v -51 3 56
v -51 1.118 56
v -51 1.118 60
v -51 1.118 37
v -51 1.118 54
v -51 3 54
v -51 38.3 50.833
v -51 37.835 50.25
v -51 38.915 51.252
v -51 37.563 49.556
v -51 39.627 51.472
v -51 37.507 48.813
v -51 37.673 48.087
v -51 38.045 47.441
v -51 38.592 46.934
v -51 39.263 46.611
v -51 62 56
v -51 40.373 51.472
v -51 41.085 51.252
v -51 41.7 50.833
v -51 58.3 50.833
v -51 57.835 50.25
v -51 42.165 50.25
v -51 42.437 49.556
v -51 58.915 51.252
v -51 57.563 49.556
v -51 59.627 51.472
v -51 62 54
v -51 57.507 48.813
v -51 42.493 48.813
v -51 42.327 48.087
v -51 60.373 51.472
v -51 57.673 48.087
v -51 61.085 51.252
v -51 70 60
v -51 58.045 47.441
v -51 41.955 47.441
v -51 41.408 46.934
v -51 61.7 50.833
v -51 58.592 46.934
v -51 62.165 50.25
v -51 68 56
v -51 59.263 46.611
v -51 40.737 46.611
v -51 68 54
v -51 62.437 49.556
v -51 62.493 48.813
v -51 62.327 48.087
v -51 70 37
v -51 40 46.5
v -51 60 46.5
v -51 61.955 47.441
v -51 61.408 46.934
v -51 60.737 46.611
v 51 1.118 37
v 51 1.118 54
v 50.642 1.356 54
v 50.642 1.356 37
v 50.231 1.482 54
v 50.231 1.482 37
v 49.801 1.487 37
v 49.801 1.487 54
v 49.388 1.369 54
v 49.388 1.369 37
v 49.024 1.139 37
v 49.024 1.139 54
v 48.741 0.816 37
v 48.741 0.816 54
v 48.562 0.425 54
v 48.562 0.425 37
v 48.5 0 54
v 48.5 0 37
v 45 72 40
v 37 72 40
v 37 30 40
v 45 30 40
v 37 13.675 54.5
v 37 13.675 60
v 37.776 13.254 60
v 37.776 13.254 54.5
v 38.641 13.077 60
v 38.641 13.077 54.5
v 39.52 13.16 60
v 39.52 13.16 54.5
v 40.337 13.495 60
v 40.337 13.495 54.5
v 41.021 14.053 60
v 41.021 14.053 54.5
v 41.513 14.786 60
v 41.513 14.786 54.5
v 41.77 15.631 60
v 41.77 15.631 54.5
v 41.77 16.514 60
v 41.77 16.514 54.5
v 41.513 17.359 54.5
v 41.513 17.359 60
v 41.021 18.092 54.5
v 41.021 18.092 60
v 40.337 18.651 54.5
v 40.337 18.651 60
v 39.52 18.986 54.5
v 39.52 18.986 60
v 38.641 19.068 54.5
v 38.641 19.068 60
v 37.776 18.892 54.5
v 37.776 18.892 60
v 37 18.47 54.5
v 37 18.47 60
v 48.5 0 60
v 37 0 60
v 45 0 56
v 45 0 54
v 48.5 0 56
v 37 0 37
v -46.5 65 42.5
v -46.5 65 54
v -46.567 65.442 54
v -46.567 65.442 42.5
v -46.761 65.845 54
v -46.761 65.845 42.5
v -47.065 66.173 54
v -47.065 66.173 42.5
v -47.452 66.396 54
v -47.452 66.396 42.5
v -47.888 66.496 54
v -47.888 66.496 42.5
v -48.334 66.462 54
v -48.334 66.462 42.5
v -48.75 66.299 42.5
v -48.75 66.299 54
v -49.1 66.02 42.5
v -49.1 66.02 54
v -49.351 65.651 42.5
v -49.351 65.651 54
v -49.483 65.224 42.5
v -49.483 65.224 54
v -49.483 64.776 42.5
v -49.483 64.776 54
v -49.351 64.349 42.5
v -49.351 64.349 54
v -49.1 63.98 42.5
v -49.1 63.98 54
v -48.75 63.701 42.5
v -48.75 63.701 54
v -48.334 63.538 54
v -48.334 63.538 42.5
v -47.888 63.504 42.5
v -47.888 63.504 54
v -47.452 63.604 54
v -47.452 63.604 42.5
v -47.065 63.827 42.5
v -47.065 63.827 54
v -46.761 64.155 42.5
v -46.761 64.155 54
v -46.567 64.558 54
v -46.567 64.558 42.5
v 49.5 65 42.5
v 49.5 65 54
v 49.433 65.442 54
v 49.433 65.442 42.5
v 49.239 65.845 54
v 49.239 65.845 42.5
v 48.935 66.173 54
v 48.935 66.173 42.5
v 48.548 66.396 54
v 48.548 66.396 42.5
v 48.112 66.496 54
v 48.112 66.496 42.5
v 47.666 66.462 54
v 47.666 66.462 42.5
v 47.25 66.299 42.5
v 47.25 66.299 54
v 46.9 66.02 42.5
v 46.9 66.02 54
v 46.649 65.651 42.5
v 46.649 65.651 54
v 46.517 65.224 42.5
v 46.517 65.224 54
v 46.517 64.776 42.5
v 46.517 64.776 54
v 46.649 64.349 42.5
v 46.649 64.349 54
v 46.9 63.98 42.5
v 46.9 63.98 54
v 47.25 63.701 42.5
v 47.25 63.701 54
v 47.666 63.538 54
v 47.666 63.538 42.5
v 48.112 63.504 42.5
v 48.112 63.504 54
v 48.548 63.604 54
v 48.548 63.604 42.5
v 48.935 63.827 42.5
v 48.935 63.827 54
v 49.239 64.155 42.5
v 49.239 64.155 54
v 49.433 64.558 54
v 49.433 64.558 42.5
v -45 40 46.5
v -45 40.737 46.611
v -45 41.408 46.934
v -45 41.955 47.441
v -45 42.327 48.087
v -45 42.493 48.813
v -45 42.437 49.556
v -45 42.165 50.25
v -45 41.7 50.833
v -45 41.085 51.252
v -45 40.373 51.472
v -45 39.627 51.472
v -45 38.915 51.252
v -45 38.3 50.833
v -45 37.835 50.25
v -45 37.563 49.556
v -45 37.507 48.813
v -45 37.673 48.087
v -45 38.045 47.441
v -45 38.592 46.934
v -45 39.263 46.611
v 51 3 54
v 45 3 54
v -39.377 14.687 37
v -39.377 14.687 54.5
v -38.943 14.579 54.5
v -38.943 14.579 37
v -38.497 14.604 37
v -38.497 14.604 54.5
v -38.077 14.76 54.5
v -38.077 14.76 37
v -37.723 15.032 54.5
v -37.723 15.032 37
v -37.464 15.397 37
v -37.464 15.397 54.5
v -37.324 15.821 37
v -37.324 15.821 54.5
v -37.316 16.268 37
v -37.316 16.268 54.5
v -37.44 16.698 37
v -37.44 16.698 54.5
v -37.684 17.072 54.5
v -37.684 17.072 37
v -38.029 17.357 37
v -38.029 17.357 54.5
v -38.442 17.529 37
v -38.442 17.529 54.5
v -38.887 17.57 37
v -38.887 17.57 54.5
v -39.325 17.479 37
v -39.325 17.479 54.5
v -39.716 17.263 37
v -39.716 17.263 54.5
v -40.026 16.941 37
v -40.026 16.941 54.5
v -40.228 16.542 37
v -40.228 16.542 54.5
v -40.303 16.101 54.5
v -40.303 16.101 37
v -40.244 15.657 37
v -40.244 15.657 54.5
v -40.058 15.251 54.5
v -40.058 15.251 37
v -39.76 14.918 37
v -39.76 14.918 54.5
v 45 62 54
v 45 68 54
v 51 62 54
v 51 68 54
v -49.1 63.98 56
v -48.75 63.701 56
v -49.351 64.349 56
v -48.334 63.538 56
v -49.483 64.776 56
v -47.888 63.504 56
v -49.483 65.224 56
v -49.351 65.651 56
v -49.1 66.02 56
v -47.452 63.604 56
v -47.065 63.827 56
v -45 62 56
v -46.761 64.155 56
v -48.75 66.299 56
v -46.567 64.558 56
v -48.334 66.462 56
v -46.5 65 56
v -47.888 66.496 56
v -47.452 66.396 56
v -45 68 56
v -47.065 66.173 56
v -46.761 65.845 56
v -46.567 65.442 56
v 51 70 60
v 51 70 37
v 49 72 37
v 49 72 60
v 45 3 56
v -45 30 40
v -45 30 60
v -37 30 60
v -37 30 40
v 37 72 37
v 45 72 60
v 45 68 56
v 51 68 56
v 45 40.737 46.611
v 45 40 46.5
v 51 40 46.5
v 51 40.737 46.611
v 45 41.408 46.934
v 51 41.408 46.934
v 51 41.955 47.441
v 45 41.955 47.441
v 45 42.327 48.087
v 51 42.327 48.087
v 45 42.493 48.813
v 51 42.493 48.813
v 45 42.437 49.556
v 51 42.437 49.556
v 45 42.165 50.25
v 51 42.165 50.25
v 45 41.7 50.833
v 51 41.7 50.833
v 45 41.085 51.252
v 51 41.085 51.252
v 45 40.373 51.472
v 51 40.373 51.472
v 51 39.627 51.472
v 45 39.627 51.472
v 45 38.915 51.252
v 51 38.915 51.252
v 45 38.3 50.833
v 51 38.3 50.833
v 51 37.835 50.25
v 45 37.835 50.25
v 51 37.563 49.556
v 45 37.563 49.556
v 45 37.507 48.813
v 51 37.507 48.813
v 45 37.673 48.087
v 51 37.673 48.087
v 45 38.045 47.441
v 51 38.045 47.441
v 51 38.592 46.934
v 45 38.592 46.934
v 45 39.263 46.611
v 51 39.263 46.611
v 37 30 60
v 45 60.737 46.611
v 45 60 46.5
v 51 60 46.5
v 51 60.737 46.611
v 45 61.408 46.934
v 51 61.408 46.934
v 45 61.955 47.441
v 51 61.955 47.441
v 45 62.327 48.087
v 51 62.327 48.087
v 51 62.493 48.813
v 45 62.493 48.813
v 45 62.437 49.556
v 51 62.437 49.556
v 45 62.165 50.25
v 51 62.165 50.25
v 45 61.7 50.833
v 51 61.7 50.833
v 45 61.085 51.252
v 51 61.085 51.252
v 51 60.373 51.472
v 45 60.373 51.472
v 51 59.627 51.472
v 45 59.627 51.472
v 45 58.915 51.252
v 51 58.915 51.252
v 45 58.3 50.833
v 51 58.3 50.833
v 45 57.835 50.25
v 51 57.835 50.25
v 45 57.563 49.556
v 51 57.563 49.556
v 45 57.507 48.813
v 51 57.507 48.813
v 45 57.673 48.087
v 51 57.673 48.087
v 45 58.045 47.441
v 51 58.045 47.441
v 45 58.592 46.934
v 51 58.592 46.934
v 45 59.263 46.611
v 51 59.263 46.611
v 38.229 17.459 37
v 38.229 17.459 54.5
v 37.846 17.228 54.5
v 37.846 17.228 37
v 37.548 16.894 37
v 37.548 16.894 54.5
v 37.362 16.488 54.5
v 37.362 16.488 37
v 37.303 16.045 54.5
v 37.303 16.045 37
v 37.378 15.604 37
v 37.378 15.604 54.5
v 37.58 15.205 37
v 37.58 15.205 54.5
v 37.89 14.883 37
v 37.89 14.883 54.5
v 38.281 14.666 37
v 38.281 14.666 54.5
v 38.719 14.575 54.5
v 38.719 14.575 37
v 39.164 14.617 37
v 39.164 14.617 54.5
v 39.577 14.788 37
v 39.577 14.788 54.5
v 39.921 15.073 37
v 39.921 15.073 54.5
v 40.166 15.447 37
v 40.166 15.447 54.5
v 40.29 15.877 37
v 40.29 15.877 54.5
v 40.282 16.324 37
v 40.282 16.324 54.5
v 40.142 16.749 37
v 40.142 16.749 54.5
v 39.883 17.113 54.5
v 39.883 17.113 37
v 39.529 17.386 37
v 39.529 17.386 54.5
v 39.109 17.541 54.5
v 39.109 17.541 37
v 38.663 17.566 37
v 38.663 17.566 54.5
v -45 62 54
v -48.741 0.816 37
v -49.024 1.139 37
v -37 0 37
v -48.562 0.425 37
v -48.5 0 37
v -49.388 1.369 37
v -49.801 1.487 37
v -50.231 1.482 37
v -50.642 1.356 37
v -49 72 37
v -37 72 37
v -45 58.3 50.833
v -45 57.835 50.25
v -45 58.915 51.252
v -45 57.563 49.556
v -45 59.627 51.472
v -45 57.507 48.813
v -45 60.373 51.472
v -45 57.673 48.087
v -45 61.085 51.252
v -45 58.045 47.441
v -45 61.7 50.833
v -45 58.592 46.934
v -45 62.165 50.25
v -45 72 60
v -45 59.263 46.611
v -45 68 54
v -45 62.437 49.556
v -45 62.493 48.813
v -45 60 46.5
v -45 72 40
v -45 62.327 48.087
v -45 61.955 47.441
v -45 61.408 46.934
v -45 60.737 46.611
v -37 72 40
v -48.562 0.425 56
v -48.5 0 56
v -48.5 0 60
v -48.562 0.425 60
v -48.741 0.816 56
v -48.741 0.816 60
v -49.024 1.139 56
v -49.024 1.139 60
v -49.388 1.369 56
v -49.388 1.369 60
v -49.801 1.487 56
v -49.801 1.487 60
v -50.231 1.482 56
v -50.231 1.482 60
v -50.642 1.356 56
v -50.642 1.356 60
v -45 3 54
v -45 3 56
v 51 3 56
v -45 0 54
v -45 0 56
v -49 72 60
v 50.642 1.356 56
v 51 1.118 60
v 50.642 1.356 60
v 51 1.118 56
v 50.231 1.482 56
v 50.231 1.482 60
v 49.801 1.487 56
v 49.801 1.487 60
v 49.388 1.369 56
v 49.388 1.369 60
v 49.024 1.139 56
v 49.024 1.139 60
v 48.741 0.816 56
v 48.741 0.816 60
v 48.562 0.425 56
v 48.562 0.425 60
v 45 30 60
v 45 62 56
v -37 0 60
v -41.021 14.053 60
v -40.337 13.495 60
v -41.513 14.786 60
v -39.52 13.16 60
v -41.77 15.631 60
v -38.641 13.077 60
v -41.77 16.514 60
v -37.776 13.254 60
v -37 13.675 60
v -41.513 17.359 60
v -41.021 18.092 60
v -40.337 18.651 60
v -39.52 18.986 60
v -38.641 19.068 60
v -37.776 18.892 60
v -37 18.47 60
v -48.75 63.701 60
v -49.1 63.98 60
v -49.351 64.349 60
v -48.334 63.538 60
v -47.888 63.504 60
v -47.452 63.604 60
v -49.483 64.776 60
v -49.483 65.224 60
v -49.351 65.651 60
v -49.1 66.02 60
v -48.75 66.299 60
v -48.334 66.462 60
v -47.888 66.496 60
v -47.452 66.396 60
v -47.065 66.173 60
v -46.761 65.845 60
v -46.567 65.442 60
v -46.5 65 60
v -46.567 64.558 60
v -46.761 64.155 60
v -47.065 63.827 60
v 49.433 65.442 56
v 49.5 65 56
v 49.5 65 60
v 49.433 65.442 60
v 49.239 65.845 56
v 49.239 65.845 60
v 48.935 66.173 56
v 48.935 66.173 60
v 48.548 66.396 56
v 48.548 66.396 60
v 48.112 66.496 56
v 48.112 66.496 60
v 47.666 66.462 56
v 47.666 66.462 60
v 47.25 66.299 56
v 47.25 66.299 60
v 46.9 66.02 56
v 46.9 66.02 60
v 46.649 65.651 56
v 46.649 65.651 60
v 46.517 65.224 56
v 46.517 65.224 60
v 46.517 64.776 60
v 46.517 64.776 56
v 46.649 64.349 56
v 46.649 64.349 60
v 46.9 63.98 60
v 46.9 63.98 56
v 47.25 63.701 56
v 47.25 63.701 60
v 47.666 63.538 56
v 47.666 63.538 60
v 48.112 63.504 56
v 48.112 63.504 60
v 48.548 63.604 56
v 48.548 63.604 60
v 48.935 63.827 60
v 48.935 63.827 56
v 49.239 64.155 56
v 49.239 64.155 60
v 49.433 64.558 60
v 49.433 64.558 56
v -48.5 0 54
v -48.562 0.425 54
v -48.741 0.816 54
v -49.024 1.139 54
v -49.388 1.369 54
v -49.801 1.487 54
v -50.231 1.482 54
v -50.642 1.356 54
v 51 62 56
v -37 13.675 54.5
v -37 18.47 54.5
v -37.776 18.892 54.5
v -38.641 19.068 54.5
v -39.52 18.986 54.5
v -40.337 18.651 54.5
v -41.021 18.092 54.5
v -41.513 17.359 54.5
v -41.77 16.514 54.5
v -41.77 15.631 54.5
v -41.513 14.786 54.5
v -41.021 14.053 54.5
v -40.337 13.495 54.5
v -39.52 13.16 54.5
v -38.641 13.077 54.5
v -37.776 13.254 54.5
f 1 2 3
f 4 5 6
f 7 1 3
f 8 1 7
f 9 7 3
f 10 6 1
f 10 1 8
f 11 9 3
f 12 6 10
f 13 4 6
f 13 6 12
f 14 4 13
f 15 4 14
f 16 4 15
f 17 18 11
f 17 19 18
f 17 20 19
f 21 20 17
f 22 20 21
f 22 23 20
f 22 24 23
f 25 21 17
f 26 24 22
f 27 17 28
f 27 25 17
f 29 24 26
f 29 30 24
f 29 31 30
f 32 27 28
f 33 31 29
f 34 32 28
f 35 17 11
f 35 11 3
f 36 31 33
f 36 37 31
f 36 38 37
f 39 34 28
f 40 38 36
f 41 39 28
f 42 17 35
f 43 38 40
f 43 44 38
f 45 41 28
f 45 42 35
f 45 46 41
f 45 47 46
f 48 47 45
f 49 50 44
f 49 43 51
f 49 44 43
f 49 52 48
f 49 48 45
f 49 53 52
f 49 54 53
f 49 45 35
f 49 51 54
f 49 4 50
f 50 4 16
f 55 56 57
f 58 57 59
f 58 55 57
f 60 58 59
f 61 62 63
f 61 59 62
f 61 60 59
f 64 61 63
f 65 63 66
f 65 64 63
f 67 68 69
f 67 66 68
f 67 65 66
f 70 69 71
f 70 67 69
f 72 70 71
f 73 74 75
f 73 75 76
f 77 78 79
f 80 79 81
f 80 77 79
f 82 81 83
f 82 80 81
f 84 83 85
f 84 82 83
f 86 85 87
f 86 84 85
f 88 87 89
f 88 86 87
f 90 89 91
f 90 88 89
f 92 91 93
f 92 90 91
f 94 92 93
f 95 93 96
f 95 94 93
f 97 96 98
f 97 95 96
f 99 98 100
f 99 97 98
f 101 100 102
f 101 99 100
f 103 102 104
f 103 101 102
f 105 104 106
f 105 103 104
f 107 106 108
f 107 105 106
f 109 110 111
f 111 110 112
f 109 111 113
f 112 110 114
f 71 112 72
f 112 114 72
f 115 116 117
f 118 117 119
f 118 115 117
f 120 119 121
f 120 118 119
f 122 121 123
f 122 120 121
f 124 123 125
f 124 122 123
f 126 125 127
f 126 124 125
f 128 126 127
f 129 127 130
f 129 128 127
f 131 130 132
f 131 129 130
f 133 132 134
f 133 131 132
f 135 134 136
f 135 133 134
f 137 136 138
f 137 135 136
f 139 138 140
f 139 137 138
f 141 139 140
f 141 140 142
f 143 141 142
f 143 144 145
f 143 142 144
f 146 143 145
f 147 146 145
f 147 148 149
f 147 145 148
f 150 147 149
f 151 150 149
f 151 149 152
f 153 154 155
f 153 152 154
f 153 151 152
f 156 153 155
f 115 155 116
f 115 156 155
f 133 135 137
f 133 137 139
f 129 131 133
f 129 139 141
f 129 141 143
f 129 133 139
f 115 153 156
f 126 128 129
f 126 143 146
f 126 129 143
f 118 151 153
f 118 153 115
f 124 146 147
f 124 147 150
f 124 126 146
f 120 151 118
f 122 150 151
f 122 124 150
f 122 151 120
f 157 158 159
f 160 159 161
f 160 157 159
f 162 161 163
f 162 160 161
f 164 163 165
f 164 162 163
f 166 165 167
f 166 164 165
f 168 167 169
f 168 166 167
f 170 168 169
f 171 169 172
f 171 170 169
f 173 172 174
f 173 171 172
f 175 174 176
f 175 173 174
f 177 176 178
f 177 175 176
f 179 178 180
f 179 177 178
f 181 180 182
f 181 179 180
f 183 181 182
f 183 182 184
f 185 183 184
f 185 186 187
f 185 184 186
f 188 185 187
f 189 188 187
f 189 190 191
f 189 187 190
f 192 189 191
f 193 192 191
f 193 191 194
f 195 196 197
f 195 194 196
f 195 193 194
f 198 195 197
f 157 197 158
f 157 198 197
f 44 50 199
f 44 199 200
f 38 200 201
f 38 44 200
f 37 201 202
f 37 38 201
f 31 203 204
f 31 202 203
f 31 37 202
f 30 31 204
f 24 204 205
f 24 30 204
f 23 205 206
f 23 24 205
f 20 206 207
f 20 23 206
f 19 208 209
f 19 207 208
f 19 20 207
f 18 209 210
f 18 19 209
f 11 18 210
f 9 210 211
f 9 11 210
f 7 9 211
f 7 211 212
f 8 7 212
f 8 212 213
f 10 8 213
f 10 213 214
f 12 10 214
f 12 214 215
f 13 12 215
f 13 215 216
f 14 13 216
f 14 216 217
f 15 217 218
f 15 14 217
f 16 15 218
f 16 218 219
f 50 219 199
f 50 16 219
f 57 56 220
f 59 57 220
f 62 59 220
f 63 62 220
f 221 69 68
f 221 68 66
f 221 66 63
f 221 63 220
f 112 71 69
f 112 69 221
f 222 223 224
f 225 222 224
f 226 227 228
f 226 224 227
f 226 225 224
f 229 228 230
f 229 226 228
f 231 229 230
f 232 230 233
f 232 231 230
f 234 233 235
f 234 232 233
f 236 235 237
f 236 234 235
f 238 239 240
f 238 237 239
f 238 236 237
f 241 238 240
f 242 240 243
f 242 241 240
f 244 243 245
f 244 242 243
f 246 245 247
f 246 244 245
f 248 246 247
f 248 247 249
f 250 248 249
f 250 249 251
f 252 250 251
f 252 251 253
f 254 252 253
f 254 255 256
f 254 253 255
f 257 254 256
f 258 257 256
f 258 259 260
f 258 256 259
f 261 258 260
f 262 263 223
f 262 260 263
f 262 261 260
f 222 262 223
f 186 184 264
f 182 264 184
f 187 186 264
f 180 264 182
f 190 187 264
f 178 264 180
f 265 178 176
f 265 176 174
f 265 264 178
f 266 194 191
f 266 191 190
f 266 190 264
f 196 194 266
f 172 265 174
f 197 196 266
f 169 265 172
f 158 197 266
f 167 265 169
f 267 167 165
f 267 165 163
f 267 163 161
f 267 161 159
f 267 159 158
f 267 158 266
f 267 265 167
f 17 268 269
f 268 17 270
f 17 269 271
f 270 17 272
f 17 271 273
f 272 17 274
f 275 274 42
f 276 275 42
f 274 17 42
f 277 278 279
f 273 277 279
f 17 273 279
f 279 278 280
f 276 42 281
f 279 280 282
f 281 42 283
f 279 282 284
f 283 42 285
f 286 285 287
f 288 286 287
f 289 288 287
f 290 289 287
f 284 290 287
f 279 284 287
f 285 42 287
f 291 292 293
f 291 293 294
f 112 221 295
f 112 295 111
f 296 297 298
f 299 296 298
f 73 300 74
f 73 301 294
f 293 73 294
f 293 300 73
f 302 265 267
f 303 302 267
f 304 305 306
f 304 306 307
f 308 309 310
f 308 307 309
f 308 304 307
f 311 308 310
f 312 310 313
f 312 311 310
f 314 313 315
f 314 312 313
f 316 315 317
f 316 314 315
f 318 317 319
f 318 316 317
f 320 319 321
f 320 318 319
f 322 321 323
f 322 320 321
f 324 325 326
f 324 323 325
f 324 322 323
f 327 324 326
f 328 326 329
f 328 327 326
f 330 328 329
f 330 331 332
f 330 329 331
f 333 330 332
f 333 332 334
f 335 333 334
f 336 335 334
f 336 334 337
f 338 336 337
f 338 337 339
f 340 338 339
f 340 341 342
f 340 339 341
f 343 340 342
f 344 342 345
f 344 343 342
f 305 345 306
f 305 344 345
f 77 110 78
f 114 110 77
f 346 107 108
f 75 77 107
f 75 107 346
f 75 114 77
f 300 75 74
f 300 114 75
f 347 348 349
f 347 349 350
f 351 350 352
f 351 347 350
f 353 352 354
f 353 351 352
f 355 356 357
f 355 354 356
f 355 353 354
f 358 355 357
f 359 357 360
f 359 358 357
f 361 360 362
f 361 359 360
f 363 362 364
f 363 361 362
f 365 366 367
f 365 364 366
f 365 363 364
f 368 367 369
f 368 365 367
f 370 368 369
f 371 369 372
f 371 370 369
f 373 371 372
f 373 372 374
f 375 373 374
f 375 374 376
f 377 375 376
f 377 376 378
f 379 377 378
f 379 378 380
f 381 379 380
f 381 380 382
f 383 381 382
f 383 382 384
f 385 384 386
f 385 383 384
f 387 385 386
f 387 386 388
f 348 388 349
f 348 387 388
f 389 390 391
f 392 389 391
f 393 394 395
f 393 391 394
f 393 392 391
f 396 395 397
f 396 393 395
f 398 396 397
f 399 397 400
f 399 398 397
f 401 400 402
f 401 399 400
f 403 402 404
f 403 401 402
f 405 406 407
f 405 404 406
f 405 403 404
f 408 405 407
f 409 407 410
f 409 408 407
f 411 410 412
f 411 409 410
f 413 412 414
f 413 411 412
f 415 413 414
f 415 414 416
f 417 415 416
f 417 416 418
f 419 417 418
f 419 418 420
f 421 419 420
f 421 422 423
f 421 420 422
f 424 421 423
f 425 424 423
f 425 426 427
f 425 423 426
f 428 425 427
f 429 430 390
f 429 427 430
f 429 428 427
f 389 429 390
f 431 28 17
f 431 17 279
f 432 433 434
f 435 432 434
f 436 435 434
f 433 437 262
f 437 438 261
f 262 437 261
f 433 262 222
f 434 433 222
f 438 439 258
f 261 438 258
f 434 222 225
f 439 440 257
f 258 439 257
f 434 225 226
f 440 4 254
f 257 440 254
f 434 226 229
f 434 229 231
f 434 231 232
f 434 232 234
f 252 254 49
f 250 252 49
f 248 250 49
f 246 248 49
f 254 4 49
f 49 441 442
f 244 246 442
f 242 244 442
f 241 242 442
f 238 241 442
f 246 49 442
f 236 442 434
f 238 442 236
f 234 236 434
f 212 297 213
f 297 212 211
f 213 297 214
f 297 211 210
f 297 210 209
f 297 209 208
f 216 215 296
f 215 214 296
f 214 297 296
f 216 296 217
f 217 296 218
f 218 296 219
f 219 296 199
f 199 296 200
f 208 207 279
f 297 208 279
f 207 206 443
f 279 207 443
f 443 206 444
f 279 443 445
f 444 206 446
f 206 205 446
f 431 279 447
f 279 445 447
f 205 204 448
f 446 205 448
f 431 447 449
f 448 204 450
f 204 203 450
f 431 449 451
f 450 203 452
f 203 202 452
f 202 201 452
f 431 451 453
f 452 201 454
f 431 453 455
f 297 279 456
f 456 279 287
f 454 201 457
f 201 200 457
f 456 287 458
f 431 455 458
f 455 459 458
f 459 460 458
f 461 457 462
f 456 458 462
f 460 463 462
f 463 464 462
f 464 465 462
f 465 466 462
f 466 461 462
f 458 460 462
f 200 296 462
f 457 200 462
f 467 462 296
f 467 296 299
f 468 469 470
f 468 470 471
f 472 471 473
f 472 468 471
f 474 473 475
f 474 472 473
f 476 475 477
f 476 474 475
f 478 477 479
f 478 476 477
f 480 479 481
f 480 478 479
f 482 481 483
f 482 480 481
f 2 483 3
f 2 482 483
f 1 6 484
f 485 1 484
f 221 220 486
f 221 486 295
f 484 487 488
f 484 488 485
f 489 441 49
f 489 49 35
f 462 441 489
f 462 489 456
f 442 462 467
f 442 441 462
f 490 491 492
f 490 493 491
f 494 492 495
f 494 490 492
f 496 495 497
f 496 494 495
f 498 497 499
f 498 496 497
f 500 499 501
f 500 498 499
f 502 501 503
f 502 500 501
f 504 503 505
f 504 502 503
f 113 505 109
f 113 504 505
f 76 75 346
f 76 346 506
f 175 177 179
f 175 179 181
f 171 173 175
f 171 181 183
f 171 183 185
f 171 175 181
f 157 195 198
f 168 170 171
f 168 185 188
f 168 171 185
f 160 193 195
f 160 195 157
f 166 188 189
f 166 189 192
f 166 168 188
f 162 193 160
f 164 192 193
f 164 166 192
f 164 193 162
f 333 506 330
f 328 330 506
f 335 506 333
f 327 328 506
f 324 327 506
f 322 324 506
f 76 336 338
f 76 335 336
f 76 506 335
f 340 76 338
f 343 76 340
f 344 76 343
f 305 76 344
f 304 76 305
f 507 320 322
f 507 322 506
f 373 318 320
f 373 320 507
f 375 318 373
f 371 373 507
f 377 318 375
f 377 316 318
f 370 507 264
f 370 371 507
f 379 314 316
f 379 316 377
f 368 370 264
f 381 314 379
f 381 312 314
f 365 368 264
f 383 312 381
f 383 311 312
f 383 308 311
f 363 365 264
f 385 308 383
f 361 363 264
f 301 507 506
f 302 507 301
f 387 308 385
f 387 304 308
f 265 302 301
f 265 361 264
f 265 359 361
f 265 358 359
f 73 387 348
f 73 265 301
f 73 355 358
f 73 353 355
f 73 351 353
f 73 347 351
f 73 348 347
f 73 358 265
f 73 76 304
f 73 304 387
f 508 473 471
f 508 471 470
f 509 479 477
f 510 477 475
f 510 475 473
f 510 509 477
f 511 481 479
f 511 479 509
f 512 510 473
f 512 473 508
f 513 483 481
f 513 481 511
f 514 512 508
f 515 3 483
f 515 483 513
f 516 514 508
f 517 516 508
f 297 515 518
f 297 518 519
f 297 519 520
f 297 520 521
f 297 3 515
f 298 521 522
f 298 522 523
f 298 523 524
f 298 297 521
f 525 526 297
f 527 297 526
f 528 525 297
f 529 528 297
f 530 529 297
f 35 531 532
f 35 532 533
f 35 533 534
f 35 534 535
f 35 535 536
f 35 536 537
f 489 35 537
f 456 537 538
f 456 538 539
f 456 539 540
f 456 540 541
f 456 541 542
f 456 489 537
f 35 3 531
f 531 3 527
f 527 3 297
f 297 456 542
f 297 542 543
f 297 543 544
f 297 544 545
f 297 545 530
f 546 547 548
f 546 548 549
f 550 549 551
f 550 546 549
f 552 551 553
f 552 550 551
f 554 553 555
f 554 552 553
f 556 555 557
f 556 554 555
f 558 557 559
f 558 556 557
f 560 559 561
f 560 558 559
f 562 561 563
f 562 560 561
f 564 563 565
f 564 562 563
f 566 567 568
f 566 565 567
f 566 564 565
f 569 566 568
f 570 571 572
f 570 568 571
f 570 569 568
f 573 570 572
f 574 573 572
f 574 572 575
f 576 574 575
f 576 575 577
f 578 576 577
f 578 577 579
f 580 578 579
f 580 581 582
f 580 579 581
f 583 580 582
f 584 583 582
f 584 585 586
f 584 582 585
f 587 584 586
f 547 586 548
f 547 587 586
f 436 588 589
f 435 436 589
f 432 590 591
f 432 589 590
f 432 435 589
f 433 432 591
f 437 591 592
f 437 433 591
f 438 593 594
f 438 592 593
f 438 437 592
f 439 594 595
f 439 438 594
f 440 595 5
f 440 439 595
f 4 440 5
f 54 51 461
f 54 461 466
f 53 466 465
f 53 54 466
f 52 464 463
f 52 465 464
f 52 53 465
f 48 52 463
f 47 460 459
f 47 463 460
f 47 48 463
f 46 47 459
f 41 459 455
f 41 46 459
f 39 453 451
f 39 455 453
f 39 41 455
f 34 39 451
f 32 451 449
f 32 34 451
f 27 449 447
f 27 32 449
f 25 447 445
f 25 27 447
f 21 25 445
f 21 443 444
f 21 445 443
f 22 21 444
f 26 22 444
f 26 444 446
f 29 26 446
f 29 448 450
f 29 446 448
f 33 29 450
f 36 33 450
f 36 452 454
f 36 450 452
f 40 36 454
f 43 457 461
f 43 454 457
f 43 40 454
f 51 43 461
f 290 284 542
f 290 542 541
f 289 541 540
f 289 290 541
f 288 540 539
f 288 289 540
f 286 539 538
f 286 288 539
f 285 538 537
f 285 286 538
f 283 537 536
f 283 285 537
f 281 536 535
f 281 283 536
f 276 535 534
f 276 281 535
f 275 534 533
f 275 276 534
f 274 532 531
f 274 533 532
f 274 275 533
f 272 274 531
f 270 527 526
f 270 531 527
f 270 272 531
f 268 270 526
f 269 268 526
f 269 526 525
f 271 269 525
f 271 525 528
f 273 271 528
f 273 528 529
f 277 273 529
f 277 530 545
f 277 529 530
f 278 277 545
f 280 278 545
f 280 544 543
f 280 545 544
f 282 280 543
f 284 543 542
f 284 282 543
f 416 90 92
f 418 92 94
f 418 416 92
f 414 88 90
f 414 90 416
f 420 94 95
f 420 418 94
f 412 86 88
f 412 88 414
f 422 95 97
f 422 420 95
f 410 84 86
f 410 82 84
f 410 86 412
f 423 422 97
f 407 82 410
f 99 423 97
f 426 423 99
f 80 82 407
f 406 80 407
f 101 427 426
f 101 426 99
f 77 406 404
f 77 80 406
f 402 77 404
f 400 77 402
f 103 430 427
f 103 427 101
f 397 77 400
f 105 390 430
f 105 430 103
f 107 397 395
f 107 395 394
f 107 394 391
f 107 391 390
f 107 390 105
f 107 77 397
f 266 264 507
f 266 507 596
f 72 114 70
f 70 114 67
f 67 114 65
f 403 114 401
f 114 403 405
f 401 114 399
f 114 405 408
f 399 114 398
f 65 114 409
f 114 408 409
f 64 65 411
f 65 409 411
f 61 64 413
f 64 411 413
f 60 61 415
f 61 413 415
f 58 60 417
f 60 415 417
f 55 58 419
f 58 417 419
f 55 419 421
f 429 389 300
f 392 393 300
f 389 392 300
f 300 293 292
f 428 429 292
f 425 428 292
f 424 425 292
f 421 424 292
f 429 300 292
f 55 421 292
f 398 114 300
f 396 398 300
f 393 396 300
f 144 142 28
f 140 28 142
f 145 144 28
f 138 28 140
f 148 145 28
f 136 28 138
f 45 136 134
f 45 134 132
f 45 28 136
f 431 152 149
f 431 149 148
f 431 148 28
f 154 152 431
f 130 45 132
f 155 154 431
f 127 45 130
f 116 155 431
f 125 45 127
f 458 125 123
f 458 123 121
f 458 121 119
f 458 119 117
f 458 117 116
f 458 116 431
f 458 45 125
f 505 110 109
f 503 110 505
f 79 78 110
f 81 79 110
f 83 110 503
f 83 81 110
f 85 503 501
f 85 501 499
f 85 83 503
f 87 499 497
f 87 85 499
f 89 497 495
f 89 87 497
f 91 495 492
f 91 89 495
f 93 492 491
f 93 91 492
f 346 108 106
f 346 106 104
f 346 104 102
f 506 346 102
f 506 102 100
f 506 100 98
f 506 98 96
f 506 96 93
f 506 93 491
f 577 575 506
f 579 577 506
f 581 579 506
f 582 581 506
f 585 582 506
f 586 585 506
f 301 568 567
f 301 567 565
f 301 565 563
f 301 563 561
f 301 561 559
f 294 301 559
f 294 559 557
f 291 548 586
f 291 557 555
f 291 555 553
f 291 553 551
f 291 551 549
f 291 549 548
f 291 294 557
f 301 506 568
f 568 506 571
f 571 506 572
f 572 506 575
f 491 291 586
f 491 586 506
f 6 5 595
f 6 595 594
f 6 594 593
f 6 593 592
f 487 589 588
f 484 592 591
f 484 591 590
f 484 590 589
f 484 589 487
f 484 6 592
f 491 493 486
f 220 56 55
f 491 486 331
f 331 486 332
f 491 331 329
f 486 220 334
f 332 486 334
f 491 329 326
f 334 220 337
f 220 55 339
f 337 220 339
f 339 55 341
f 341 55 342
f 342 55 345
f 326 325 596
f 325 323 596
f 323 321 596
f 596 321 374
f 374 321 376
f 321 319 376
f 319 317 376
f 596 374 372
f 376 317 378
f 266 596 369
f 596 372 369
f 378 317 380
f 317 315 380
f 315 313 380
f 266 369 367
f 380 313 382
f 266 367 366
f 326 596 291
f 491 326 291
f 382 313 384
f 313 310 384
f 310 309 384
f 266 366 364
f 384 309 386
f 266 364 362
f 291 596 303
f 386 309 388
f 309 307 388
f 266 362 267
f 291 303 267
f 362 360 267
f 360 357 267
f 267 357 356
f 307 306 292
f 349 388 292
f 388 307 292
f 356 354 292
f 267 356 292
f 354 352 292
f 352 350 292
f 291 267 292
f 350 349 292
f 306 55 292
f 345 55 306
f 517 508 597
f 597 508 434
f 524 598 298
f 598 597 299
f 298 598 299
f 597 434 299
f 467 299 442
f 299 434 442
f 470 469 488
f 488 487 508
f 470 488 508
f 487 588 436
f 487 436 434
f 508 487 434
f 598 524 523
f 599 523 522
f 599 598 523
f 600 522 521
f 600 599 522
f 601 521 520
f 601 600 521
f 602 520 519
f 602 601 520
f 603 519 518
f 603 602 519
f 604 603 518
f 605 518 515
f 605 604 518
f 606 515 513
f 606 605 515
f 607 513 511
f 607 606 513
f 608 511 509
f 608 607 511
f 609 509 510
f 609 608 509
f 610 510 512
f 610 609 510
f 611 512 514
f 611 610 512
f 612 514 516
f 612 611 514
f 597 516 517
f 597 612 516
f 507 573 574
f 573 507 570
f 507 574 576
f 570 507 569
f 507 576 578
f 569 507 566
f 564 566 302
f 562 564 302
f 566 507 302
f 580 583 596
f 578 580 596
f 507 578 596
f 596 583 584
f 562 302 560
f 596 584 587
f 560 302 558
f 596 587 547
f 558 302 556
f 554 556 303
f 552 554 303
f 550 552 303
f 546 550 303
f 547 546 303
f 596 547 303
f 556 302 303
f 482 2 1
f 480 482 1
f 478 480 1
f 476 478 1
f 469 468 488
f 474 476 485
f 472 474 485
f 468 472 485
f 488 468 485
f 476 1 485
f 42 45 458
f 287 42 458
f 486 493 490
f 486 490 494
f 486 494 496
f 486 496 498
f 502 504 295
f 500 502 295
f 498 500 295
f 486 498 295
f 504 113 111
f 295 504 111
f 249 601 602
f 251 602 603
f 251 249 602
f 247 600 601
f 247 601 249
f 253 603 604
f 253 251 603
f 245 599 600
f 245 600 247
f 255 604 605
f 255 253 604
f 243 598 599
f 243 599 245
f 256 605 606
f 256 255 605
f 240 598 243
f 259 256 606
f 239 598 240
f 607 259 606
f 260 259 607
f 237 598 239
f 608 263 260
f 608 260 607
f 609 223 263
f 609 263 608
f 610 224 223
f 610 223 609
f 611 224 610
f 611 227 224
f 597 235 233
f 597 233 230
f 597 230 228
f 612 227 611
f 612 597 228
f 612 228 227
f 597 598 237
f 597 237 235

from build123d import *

# Parameters (mm, degrees)
BOX456_W                    = 10
BOX456_H                    = 6
BOX456_DEPTH                = 2
BOX455_W                    = 10
BOX455_H                    = 6
BOX455_DEPTH                = 2
BOX453_W                    = 10
BOX453_H                    = 6
BOX453_DEPTH                = 2
BOX454_W                    = 10
BOX454_H                    = 6
BOX454_DEPTH                = 2
CYLINDER958_R               = 1.5
CYLINDER958_DEPTH           = 30
CYLINDER955_R               = 1.5
CYLINDER955_DEPTH           = 30
CYLINDER957_R               = 1.5
CYLINDER957_DEPTH           = 30
CYLINDER956_R               = 1.5
CYLINDER956_DEPTH           = 30
CYLINDER911_R               = 1.5
CYLINDER911_DEPTH           = 40
CYLINDER911_PLACEMENT_ANGLE = 45
CYLINDER912_R               = 1.5
CYLINDER912_DEPTH           = 40
CYLINDER913_R               = 1.5
CYLINDER913_DEPTH           = 40
CYLINDER913_PLACEMENT_ANGLE = 135
CYLINDER908_R               = 1.5
CYLINDER908_DEPTH           = 40
CYLINDER914_R               = 1.5
CYLINDER914_DEPTH           = 40
CYLINDER914_PLACEMENT_ANGLE = 225
CYLINDER910_R               = 1.5
CYLINDER910_DEPTH           = 40
CYLINDER909_R               = 1.5
CYLINDER909_DEPTH           = 40
CYLINDER909_PLACEMENT_ANGLE = 45
CYLINDER907_R               = 1.5
CYLINDER907_DEPTH           = 40
COMPOUND797_PLACEMENT_ANGLE = 22.5
CYLINDER919_R               = 3
CYLINDER919_DEPTH           = 6
CYLINDER919_PLACEMENT_ANGLE = 45
CYLINDER920_R               = 3
CYLINDER920_DEPTH           = 6
CYLINDER921_R               = 3
CYLINDER921_DEPTH           = 6
CYLINDER921_PLACEMENT_ANGLE = 135
CYLINDER916_R               = 3
CYLINDER916_DEPTH           = 6
CYLINDER922_R               = 3
CYLINDER922_DEPTH           = 6
CYLINDER922_PLACEMENT_ANGLE = 225
CYLINDER918_R               = 3
CYLINDER918_DEPTH           = 6
CYLINDER917_R               = 3
CYLINDER917_DEPTH           = 6
CYLINDER917_PLACEMENT_ANGLE = 45
CYLINDER915_R               = 3
CYLINDER915_DEPTH           = 6
COMPOUND796_PLACEMENT_ANGLE = 22.5
BOX450_W                    = 22
BOX450_H                    = 6
BOX450_DEPTH                = 2
BOX449_W                    = 22
BOX449_H                    = 6
BOX449_DEPTH                = 2
BOX443_W                    = 20
BOX443_H                    = 200
BOX443_DEPTH                = 20
BOX444_W                    = 20
BOX444_H                    = 200
BOX444_DEPTH                = 20
CYLINDER949_R               = 1.5
CYLINDER949_DEPTH           = 30
CYLINDER948_R               = 1.5
CYLINDER948_DEPTH           = 30
CYLINDER951_R               = 2.5
CYLINDER951_DEPTH           = 40
CYLINDER952_R               = 2.5
CYLINDER952_DEPTH           = 30
CYLINDER950_R               = 2.5
CYLINDER950_DEPTH           = 160
BOX442_W                    = 14
BOX442_H                    = 72
BOX442_DEPTH                = 23
BOX441_W                    = 14
BOX441_H                    = 72
BOX441_DEPTH                = 23
CHAMFER024_SIZE             = 2


with BuildPart() as krychle456:
    # Box456 → Box456 (new body)
    with BuildSketch(Plane(origin=(55, 3, 54), x_dir=(-1, 0, 0), z_dir=(0, 0, 1))):
        with Locations((5, 3)):
            Rectangle(BOX456_W, BOX456_H)
    extrude(amount=BOX456_DEPTH)


with BuildPart() as krychle455:
    # Box455 → Box455 (new body)
    with BuildSketch(Plane(origin=(3, -55, 54), x_dir=(0, 1, 0), z_dir=(0, 0, 1))):
        with Locations((5, 3)):
            Rectangle(BOX455_W, BOX455_H)
    extrude(amount=BOX455_DEPTH)


with BuildPart() as krychle453:
    # Box453 → Box453 (new body)
    with BuildSketch(Plane(origin=(-55, -3, 54), x_dir=(1, 0, 0), z_dir=(0, 0, 1))):
        with Locations((5, 3)):
            Rectangle(BOX453_W, BOX453_H)
    extrude(amount=BOX453_DEPTH)


with BuildPart() as compound813:
    # Box454 → Box454 (new body)
    with BuildSketch(Plane(origin=(-3, 55, 54), x_dir=(0, -1, 0), z_dir=(0, 0, 1))):
        with Locations((5, 3)):
            Rectangle(BOX454_W, BOX454_H)
    extrude(amount=BOX454_DEPTH)

    # Compound813: union Krychle456, Krychle455, Krychle453
    add(krychle456.part)
    add(krychle455.part)
    add(krychle453.part)


with BuildPart() as v_lec958:
    # Cylinder958 → Cylinder958 (new body)
    with BuildSketch(Plane(origin=(50, 0, 35.5), x_dir=(-1, 0, 0), z_dir=(0, 0, 1))):
        Circle(CYLINDER958_R)
    extrude(amount=CYLINDER958_DEPTH)


with BuildPart() as v_lec955:
    # Cylinder955 → Cylinder955 (new body)
    with BuildSketch(Plane(origin=(0, -50, 35.5), x_dir=(0, 1, 0), z_dir=(0, 0, 1))):
        Circle(CYLINDER955_R)
    extrude(amount=CYLINDER955_DEPTH)


with BuildPart() as v_lec957:
    # Cylinder957 → Cylinder957 (new body)
    with BuildSketch(Plane(origin=(-50, 0, 35.5), x_dir=(1, 0, 0), z_dir=(0, 0, 1))):
        Circle(CYLINDER957_R)
    extrude(amount=CYLINDER957_DEPTH)


with BuildPart() as compound812:
    # Cylinder956 → Cylinder956 (new body)
    with BuildSketch(Plane(origin=(0, 50, 35.5), x_dir=(0, -1, 0), z_dir=(0, 0, 1))):
        Circle(CYLINDER956_R)
    extrude(amount=CYLINDER956_DEPTH)

    # Compound812: union Válec958, Válec955, Válec957
    add(v_lec958.part)
    add(v_lec955.part)
    add(v_lec957.part)


with BuildPart() as v_lec911:
    # Cylinder911 → Cylinder911 (new body)
    with BuildSketch(Plane.XY):
        Circle(CYLINDER911_R)
    extrude(amount=CYLINDER911_DEPTH)


with BuildPart() as v_lec911_1:
    # Cylinder911 placement: moved
    add(v_lec911.part.moved(Location((29.698485, -29.698485, 33.5))).rotate(Axis((29.698485, -29.698485, 33.5), (0, 0, 1)), CYLINDER911_PLACEMENT_ANGLE))


with BuildPart() as v_lec912:
    # Cylinder912 → Cylinder912 (new body)
    with BuildSketch(Plane(origin=(42, 0, 33.5), x_dir=(0, 1, 0), z_dir=(0, 0, 1))):
        Circle(CYLINDER912_R)
    extrude(amount=CYLINDER912_DEPTH)


with BuildPart() as v_lec913:
    # Cylinder913 → Cylinder913 (new body)
    with BuildSketch(Plane.XY):
        Circle(CYLINDER913_R)
    extrude(amount=CYLINDER913_DEPTH)


with BuildPart() as v_lec913_1:
    # Cylinder913 placement: moved
    add(v_lec913.part.moved(Location((29.698485, 29.698485, 33.5))).rotate(Axis((29.698485, 29.698485, 33.5), (0, 0, 1)), CYLINDER913_PLACEMENT_ANGLE))


with BuildPart() as v_lec908:
    # Cylinder908 → Cylinder908 (new body)
    with BuildSketch(Plane(origin=(0, 42, 33.5), x_dir=(-1, 0, 0), z_dir=(0, 0, 1))):
        Circle(CYLINDER908_R)
    extrude(amount=CYLINDER908_DEPTH)


with BuildPart() as v_lec914:
    # Cylinder914 → Cylinder914 (new body)
    with BuildSketch(Plane.XY):
        Circle(CYLINDER914_R)
    extrude(amount=CYLINDER914_DEPTH)


with BuildPart() as v_lec914_1:
    # Cylinder914 placement: moved
    add(v_lec914.part.moved(Location((-29.698485, 29.698485, 33.5))).rotate(Axis((-29.698485, 29.698485, 33.5), (0, 0, 1)), CYLINDER914_PLACEMENT_ANGLE))


with BuildPart() as v_lec910:
    # Cylinder910 → Cylinder910 (new body)
    with BuildSketch(Plane(origin=(-42, 0, 33.5), x_dir=(0, -1, 0), z_dir=(0, 0, 1))):
        Circle(CYLINDER910_R)
    extrude(amount=CYLINDER910_DEPTH)


with BuildPart() as v_lec909:
    # Cylinder909 → Cylinder909 (new body)
    with BuildSketch(Plane.XY):
        Circle(CYLINDER909_R)
    extrude(amount=CYLINDER909_DEPTH)


with BuildPart() as v_lec909_1:
    # Cylinder909 placement: moved
    add(v_lec909.part.moved(Location((-29.698485, -29.698485, 33.5))).rotate(Axis((-29.698485, -29.698485, 33.5), (0, 0, -1)), CYLINDER909_PLACEMENT_ANGLE))


with BuildPart() as compound797:
    # Cylinder907 → Cylinder907 (new body)
    with BuildSketch(Plane(origin=(0, -42, 33.5), x_dir=(1, 0, 0), z_dir=(0, 0, 1))):
        Circle(CYLINDER907_R)
    extrude(amount=CYLINDER907_DEPTH)

    # Compound797: union Válec911, Válec912, Válec913, Válec908, Válec914, Válec910, Válec909
    add(v_lec911_1.part)
    add(v_lec912.part)
    add(v_lec913_1.part)
    add(v_lec908.part)
    add(v_lec914_1.part)
    add(v_lec910.part)
    add(v_lec909_1.part)


with BuildPart() as compound797_1:
    # Compound797 placement: moved
    add(compound797.part.rotate(Axis((0, 0, 0), (0, 0, 1)), COMPOUND797_PLACEMENT_ANGLE))


with BuildPart() as v_lec919:
    # Cylinder919 → Cylinder919 (new body)
    with BuildSketch(Plane.XY):
        Circle(CYLINDER919_R)
    extrude(amount=CYLINDER919_DEPTH)


with BuildPart() as v_lec919_1:
    # Cylinder919 placement: moved
    add(v_lec919.part.moved(Location((29.698485, -29.698485, 33.5))).rotate(Axis((29.698485, -29.698485, 33.5), (0, 0, 1)), CYLINDER919_PLACEMENT_ANGLE))


with BuildPart() as v_lec920:
    # Cylinder920 → Cylinder920 (new body)
    with BuildSketch(Plane(origin=(42, 0, 33.5), x_dir=(0, 1, 0), z_dir=(0, 0, 1))):
        Circle(CYLINDER920_R)
    extrude(amount=CYLINDER920_DEPTH)


with BuildPart() as v_lec921:
    # Cylinder921 → Cylinder921 (new body)
    with BuildSketch(Plane.XY):
        Circle(CYLINDER921_R)
    extrude(amount=CYLINDER921_DEPTH)


with BuildPart() as v_lec921_1:
    # Cylinder921 placement: moved
    add(v_lec921.part.moved(Location((29.698485, 29.698485, 33.5))).rotate(Axis((29.698485, 29.698485, 33.5), (0, 0, 1)), CYLINDER921_PLACEMENT_ANGLE))


with BuildPart() as v_lec916:
    # Cylinder916 → Cylinder916 (new body)
    with BuildSketch(Plane(origin=(0, 42, 33.5), x_dir=(-1, 0, 0), z_dir=(0, 0, 1))):
        Circle(CYLINDER916_R)
    extrude(amount=CYLINDER916_DEPTH)


with BuildPart() as v_lec922:
    # Cylinder922 → Cylinder922 (new body)
    with BuildSketch(Plane.XY):
        Circle(CYLINDER922_R)
    extrude(amount=CYLINDER922_DEPTH)


with BuildPart() as v_lec922_1:
    # Cylinder922 placement: moved
    add(v_lec922.part.moved(Location((-29.698485, 29.698485, 33.5))).rotate(Axis((-29.698485, 29.698485, 33.5), (0, 0, 1)), CYLINDER922_PLACEMENT_ANGLE))


with BuildPart() as v_lec918:
    # Cylinder918 → Cylinder918 (new body)
    with BuildSketch(Plane(origin=(-42, 0, 33.5), x_dir=(0, -1, 0), z_dir=(0, 0, 1))):
        Circle(CYLINDER918_R)
    extrude(amount=CYLINDER918_DEPTH)


with BuildPart() as v_lec917:
    # Cylinder917 → Cylinder917 (new body)
    with BuildSketch(Plane.XY):
        Circle(CYLINDER917_R)
    extrude(amount=CYLINDER917_DEPTH)


with BuildPart() as v_lec917_1:
    # Cylinder917 placement: moved
    add(v_lec917.part.moved(Location((-29.698485, -29.698485, 33.5))).rotate(Axis((-29.698485, -29.698485, 33.5), (0, 0, -1)), CYLINDER917_PLACEMENT_ANGLE))


with BuildPart() as compound796:
    # Cylinder915 → Cylinder915 (new body)
    with BuildSketch(Plane(origin=(0, -42, 33.5), x_dir=(1, 0, 0), z_dir=(0, 0, 1))):
        Circle(CYLINDER915_R)
    extrude(amount=CYLINDER915_DEPTH)

    # Compound796: union Válec919, Válec920, Válec921, Válec916, Válec922, Válec918, Válec917
    add(v_lec919_1.part)
    add(v_lec920.part)
    add(v_lec921_1.part)
    add(v_lec916.part)
    add(v_lec922_1.part)
    add(v_lec918.part)
    add(v_lec917_1.part)


with BuildPart() as compound796_1:
    # Compound796 placement: moved
    add(compound796.part.moved(Location((0, 0, 21))).rotate(Axis((0, 0, 21), (0, 0, 1)), COMPOUND796_PLACEMENT_ANGLE))


with BuildPart() as krychle450:
    # Box450 → Box450 (new body)
    with BuildSketch(Plane(origin=(39, 62, 54), x_dir=(1, 0, 0), z_dir=(0, 0, 1))):
        with Locations((11, 3)):
            Rectangle(BOX450_W, BOX450_H)
    extrude(amount=BOX450_DEPTH)


with BuildPart() as compound811:
    # Box449 → Box449 (new body)
    with BuildSketch(Plane(origin=(-64, 62, 54), x_dir=(1, 0, 0), z_dir=(0, 0, 1))):
        with Locations((11, 3)):
            Rectangle(BOX449_W, BOX449_H)
    extrude(amount=BOX449_DEPTH)

    # Compound811: union Krychle450
    add(krychle450.part)


with BuildPart() as krychle443:
    # Box443 → Box443 (new body)
    with BuildSketch(Plane(origin=(-45, 28, 8), x_dir=(1, 0, 0), z_dir=(0, 0, 1))):
        with Locations((10, 100)):
            Rectangle(BOX443_W, BOX443_H)
    extrude(amount=BOX443_DEPTH)


with BuildPart() as compound808:
    # Box444 → Box444 (new body)
    with BuildSketch(Plane(origin=(25, 28, 8), x_dir=(1, 0, 0), z_dir=(0, 0, 1))):
        with Locations((10, 100)):
            Rectangle(BOX444_W, BOX444_H)
    extrude(amount=BOX444_DEPTH)

    # Compound808: union Krychle443
    add(krychle443.part)


with BuildPart() as compound808_1:
    # Compound808 placement: moved
    add(compound808.part.moved(Location((0, 2, 32))))


with BuildPart() as v_lec949:
    # Cylinder949 → Cylinder949 (new body)
    with BuildSketch(Plane(origin=(-48, 65, 42.5), x_dir=(1, 0, 0), z_dir=(0, 0, 1))):
        Circle(CYLINDER949_R)
    extrude(amount=CYLINDER949_DEPTH)


with BuildPart() as compound805:
    # Cylinder948 → Cylinder948 (new body)
    with BuildSketch(Plane(origin=(48, 65, 42.5), x_dir=(1, 0, 0), z_dir=(0, 0, 1))):
        Circle(CYLINDER948_R)
    extrude(amount=CYLINDER948_DEPTH)

    # Compound805: union Válec949
    add(v_lec949.part)


with BuildPart() as v_lec951:
    # Cylinder951 → Cylinder951 (new body)
    with BuildSketch(Plane(origin=(-80, 38, 18), x_dir=(0, 0, -1), z_dir=(1, 0, 0))):
        Circle(CYLINDER951_R)
    extrude(amount=CYLINDER951_DEPTH)


with BuildPart() as v_lec952:
    # Cylinder952 → Cylinder952 (new body)
    with BuildSketch(Plane(origin=(41, 38, 18), x_dir=(0, 0, -1), z_dir=(1, 0, 0))):
        Circle(CYLINDER952_R)
    extrude(amount=CYLINDER952_DEPTH)


with BuildPart() as compound806:
    # Cylinder950 → Cylinder950 (new body)
    with BuildSketch(Plane(origin=(-62, 58, 18), x_dir=(0, 0, -1), z_dir=(1, 0, 0))):
        Circle(CYLINDER950_R)
    extrude(amount=CYLINDER950_DEPTH)

    # Compound806: union Válec951, Válec952
    add(v_lec951.part)
    add(v_lec952.part)


with BuildPart() as compound806_1:
    # Compound806 placement: moved
    add(compound806.part.moved(Location((-1, 2, 31))))


with BuildPart() as krychle442:
    # Box442 → Box442 (new body)
    with BuildSketch(Plane(origin=(-51, 0, 37), x_dir=(1, 0, 0), z_dir=(0, 0, 1))):
        with Locations((7, 36)):
            Rectangle(BOX442_W, BOX442_H)
    extrude(amount=BOX442_DEPTH)


with BuildPart() as chamfer024:
    # Box441 → Box441 (new body)
    with BuildSketch(Plane(origin=(37, 0, 37), x_dir=(1, 0, 0), z_dir=(0, 0, 1))):
        with Locations((7, 36)):
            Rectangle(BOX441_W, BOX441_H)
    extrude(amount=BOX441_DEPTH)

    # Compound807: union Krychle442
    add(krychle442.part)

    # Cut398: cut Compound806
    add(compound806_1.part, mode=Mode.SUBTRACT)

    # Cut397: cut Compound805
    add(compound805.part, mode=Mode.SUBTRACT)

    # Cut399: cut Compound808
    add(compound808_1.part, mode=Mode.SUBTRACT)

    # Cut401: cut Compound811
    add(compound811.part, mode=Mode.SUBTRACT)

    # Cut402: cut Compound796
    add(compound796_1.part, mode=Mode.SUBTRACT)

    # Cut403: cut Compound797
    add(compound797_1.part, mode=Mode.SUBTRACT)

    # Cut410: cut Compound812
    add(compound812.part, mode=Mode.SUBTRACT)

    # Cut411: cut Compound813
    add(compound813.part, mode=Mode.SUBTRACT)

    # Chamfer024
    chamfer024_edges = [chamfer024.edges().sort_by_distance(p)[0] for p in [
        (51, 72, 48.5),
        (-51, 72, 48.5),
    ]]
    chamfer(chamfer024_edges, length=CHAMFER024_SIZE)


solid = chamfer024.part
